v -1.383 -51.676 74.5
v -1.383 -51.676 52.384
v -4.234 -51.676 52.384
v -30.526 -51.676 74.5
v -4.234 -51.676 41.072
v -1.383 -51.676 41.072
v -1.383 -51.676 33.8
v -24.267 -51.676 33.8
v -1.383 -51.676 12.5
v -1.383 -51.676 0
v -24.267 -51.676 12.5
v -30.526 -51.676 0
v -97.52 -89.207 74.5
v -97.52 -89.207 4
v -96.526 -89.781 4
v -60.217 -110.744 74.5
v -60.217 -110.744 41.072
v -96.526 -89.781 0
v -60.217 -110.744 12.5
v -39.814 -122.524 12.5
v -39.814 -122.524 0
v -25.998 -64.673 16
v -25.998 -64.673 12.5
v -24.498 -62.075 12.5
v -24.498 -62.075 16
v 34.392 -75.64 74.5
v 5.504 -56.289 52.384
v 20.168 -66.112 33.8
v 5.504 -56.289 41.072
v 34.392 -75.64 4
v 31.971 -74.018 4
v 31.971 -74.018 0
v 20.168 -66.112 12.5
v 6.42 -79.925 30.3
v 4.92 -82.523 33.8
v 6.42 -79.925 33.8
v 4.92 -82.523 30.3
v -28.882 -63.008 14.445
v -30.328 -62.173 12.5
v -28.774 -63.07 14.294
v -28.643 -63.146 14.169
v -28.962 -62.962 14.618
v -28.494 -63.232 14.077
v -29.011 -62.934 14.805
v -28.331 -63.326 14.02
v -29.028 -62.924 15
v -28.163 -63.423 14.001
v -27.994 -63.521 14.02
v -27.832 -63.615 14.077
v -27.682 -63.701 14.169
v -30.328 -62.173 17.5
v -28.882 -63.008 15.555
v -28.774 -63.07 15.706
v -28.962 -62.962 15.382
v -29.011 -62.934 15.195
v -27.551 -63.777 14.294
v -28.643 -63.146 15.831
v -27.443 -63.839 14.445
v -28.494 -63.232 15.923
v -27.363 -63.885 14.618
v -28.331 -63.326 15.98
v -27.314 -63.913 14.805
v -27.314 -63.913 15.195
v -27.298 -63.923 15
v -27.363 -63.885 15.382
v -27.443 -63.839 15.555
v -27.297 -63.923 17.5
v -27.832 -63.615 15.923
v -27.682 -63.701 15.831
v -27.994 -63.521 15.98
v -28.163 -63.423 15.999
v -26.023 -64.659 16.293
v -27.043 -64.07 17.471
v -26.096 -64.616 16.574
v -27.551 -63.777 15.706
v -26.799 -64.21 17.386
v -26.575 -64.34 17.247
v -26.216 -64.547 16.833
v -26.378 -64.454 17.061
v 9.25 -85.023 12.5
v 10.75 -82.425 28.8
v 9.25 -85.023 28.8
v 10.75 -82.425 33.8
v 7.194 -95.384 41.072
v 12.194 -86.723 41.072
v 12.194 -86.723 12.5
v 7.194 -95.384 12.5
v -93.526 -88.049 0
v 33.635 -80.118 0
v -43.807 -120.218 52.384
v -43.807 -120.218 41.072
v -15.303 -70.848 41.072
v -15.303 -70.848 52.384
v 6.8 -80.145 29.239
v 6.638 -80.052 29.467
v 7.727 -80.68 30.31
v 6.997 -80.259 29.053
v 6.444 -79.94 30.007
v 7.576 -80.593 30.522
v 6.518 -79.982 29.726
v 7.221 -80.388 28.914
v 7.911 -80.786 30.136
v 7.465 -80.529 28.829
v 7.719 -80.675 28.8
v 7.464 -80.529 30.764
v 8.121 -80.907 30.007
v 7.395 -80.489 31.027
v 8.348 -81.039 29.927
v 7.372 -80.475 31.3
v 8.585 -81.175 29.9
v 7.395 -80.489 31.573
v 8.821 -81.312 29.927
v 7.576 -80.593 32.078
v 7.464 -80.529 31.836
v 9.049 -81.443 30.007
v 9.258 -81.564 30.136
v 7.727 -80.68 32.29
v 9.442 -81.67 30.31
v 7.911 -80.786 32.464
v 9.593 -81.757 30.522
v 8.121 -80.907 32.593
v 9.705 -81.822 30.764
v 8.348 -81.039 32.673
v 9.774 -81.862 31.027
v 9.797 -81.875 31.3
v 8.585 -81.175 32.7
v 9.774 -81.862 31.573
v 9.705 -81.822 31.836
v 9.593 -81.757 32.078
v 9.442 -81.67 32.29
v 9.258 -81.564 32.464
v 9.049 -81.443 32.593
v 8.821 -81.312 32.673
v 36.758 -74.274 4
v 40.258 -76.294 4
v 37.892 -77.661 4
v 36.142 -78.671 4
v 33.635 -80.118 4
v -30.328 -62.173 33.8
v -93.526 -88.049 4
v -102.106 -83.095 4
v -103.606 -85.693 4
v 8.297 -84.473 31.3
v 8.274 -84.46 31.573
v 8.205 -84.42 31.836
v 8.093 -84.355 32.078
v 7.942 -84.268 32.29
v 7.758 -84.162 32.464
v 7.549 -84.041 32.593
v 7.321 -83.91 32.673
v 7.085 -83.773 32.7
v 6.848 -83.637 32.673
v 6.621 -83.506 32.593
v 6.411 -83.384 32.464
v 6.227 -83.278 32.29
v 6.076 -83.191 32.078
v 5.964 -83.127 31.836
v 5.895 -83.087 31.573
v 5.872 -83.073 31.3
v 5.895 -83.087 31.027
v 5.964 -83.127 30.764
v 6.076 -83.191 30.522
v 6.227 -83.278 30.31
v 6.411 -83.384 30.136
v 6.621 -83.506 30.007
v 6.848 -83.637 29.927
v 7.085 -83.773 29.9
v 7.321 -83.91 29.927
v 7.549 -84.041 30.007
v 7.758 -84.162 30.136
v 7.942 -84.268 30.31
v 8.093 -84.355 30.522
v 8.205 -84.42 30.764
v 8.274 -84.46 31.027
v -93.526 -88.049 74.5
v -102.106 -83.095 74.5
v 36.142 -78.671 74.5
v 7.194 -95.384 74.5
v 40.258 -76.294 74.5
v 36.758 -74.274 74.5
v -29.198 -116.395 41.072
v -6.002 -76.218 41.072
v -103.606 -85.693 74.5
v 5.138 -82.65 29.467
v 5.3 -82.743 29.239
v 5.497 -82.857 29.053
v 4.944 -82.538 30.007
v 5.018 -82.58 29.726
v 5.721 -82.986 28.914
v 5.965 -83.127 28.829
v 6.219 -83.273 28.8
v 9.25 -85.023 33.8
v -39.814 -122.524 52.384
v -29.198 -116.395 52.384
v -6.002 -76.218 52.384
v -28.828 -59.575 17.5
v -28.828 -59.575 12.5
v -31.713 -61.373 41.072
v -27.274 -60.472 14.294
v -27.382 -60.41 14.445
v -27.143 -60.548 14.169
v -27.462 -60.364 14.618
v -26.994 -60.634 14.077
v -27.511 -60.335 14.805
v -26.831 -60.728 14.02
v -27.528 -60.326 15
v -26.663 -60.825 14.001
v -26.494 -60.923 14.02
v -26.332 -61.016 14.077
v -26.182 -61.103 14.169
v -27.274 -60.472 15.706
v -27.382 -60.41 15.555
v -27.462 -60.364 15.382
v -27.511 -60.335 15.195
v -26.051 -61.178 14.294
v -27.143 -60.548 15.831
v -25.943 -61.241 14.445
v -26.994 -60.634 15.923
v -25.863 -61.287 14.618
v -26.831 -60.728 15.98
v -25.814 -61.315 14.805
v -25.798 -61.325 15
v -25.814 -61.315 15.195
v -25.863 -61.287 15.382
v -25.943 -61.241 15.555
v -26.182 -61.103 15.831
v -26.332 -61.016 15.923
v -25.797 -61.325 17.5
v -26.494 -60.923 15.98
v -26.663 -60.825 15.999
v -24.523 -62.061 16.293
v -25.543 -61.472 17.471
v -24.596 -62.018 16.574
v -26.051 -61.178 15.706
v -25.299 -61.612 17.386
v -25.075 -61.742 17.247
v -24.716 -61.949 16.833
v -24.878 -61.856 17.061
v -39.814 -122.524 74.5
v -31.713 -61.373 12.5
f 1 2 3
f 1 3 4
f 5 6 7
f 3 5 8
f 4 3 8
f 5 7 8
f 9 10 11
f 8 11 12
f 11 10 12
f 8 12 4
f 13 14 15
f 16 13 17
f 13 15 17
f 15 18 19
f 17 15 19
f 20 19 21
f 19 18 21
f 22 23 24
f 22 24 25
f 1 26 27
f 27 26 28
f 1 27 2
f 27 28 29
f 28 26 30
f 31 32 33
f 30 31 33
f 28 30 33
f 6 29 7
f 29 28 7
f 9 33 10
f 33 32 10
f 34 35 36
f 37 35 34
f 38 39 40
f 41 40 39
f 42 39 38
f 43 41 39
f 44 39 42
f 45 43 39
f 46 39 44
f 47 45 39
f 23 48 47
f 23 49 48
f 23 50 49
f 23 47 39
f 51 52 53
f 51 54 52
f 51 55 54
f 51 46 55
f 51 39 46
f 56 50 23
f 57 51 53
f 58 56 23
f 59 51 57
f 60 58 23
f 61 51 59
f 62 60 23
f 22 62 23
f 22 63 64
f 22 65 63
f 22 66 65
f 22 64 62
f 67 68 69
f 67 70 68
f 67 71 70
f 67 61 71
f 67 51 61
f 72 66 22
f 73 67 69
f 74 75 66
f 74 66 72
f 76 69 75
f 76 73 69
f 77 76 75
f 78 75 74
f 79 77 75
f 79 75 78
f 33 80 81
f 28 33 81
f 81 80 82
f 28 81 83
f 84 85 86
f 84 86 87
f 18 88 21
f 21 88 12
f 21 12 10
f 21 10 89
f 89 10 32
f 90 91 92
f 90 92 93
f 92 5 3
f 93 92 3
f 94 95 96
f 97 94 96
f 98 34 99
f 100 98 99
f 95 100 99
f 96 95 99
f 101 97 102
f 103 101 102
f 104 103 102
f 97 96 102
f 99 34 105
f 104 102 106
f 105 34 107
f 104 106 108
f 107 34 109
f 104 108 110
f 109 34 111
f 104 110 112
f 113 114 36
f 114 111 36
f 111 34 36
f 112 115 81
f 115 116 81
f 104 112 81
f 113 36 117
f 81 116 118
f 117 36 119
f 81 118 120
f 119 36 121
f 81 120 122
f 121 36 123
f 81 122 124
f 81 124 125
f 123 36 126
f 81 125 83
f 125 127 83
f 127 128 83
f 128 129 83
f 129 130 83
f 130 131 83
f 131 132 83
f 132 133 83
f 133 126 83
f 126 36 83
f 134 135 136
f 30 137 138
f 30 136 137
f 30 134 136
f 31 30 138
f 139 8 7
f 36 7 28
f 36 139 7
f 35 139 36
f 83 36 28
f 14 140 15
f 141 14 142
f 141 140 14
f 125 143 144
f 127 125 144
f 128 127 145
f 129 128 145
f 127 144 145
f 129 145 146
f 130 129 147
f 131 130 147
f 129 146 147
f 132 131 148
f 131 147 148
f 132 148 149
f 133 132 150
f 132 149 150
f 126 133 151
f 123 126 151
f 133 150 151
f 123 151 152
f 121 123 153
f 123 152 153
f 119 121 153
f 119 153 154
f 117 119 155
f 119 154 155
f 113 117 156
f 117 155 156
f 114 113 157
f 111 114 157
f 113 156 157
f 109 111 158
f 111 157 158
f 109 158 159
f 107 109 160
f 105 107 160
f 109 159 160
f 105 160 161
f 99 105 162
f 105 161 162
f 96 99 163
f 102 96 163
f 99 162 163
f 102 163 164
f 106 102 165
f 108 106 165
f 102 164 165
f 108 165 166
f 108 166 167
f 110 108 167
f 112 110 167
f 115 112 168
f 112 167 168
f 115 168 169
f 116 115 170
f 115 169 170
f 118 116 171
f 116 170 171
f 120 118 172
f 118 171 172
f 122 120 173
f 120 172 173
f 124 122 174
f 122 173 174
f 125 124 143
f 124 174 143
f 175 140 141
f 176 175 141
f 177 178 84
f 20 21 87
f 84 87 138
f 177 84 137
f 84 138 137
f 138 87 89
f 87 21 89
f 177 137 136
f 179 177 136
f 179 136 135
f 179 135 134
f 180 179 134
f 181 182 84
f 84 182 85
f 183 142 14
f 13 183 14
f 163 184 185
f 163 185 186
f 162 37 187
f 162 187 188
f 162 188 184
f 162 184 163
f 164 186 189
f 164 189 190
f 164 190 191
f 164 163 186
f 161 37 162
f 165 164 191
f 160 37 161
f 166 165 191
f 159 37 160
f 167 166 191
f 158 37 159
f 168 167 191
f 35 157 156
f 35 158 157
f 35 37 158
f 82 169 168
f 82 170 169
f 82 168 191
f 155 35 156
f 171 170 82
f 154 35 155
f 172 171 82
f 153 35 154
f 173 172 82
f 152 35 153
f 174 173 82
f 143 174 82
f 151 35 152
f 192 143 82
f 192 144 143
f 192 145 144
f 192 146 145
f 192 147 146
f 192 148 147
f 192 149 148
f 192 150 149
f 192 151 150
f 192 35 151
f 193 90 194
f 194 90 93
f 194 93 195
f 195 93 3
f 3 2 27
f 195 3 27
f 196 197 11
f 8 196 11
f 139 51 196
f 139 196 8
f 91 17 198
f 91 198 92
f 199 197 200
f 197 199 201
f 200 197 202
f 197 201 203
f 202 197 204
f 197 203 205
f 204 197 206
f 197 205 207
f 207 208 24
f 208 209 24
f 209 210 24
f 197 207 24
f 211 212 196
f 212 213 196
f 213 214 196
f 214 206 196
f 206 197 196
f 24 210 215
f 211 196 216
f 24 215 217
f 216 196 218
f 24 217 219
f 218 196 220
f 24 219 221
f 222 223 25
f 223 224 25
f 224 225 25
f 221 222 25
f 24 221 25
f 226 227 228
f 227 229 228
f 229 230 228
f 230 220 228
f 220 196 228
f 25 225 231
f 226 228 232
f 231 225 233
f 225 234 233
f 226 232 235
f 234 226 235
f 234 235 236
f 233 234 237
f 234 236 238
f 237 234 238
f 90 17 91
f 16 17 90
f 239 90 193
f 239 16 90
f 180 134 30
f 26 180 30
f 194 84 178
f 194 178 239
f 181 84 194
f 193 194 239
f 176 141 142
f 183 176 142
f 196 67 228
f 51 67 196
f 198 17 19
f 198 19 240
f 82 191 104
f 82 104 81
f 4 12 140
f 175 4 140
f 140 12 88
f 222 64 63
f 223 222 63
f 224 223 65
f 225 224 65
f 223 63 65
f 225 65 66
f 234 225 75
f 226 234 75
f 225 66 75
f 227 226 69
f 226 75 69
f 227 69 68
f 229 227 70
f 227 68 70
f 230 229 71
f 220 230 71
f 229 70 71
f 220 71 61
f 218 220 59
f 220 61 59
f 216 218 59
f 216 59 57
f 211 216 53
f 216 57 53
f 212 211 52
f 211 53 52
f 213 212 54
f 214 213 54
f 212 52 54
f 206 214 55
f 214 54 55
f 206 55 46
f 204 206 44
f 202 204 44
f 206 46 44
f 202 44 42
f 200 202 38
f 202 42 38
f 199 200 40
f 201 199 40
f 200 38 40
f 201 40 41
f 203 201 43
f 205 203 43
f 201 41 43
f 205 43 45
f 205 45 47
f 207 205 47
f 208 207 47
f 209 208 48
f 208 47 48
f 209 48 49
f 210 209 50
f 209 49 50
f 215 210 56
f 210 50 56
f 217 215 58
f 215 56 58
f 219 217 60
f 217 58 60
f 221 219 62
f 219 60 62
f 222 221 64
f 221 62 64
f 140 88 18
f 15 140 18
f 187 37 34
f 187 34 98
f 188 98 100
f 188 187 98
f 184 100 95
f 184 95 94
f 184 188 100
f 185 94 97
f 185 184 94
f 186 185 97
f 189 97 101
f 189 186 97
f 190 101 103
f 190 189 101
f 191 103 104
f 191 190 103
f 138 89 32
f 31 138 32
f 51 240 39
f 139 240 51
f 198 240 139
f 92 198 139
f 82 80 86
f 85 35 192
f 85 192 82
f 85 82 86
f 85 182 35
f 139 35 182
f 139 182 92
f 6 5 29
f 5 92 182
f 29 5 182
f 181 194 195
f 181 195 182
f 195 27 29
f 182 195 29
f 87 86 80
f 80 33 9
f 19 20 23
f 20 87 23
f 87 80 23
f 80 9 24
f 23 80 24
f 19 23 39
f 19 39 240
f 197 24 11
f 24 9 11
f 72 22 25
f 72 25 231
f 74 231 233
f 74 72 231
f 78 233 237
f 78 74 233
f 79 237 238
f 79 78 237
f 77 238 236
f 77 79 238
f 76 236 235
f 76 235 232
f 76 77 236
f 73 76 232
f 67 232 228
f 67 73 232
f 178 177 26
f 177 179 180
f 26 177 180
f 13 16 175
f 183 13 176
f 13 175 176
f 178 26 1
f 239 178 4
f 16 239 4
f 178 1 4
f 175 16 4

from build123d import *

# Parameters (mm, degrees)
EXTRUDE_1_DEPTH     = 74.5
CUT_EXTRUDE_1_DEPTH = 4
CUT_EXTRUDE_2_DEPTH = 4
CUT_EXTRUDE_3_DEPTH = 62
CUT_EXTRUDE_4_REACH = 124.795
SKETCH_5_W          = 45.7
SKETCH_5_H          = 21.3
SKETCH_6_R          = 0.998844791
SKETCH_6_R_2        = 1.4
EXTRUDE_2_DEPTH     = 3
CUT_EXTRUDE_5_REACH = 124.795
SKETCH_7_W          = 10.739655284
SKETCH_7_H          = 11.312103995
EXTRUDE_3_DEPTH     = 57.007858917
CUT_EXTRUDE_6_DEPTH = 74.5


with BuildPart() as part:
    # 草圖1 → 填料-伸長1 (new body)
    with BuildSketch(Plane.XY):
        Polygon((-93.525975622, -88.048741595), (-102.106102641, -83.095002951), (-103.606102641, -85.693079162), (-97.519536964, -89.207159494), (-39.813710348, -122.523634025), (36.141513372, -78.670865164), (40.257538776, -76.294476789), (36.757538776, -74.273750847), (34.391513372, -75.639776251), (-1.383477376, -51.675674636), (-30.525975622, -51.675674636), align=None)
    extrude(amount=EXTRUDE_1_DEPTH)

    # 草圖2 → 除料-伸長1 (cut)
    with BuildSketch(Plane(origin=(0, 0, 0), x_dir=(-1, 0, 0), z_dir=(0, 0, -1))):
        Polygon((-40.257538776, -76.294476789), (-36.757538776, -74.273750847), (-34.391513372, -75.639776251), (-37.891513372, -77.660502193), align=None)
        Polygon((102.106102641, -83.095002951), (93.525975622, -88.048741595), (96.525975622, -89.780792402), (103.606102641, -85.693079162), align=None)
    extrude(amount=-CUT_EXTRUDE_1_DEPTH, mode=Mode.SUBTRACT)

    # 草圖3 → 除料-伸長2 (cut)
    with BuildSketch(Plane(origin=(0, 0, 0), x_dir=(-1, 0, 0), z_dir=(0, 0, -1))):
        Polygon((-33.635403301, -80.117768489), (-31.970986825, -74.018371384), (-37.891513372, -77.660502193), align=None)
    extrude(amount=-CUT_EXTRUDE_2_DEPTH, mode=Mode.SUBTRACT)

    # 草圖4 → 除料-伸長3 (cut)
    with BuildSketch(Plane.XY.offset(74.5)):
        Polygon((-60.217268861, -110.743634025), (-31.713339402, -61.373379987), (12.19414857, -86.723379987), (7.19414857, -95.383634025), (-39.813710348, -122.523634025), align=None)
    extrude(amount=-CUT_EXTRUDE_3_DEPTH, mode=Mode.SUBTRACT)

    # 草圖5 → 除料-伸長4 (cut, up to next)
    with BuildSketch(Plane(origin=(-34.503787943, -59.762313771, 0), x_dir=(0.8660254037844352, -0.500000000000006, 0), z_dir=(-0.500000000000006, -0.8660254037844352, 0)), mode=Mode.PRIVATE) as cut_extrude_4_sk1:
        with Locations((27.672132433, 23.15)):
            Rectangle(SKETCH_5_W, SKETCH_5_H)
    cut_extrude_4_tool1 = extrude(cut_extrude_4_sk1.sketch, amount=-CUT_EXTRUDE_4_REACH, mode=Mode.PRIVATE) & part.part
    add(cut_extrude_4_tool1.solids().sort_by_distance((-10.539018, -73.59838, 23.15))[0], mode=Mode.SUBTRACT)

    # 草圖6 → 填料-伸長2 (add)
    # profile 1 of 2: a face of its own
    with BuildSketch(Plane(origin=(-34.503787943, -59.762313771, 0), x_dir=(0.8660254037844352, -0.500000000000006, 0), z_dir=(-0.500000000000006, -0.8660254037844352, 0))):
        with BuildLine():
            Line((4.822132433, 17.5), (4.822132433, 12.5))
            Line((4.822132433, 12.5), (9.822132433, 12.5))
            Line((9.822132433, 12.5), (9.822132433, 16))
            ThreePointArc((9.822132433, 16), (9.382792604, 17.060660172), (8.322132433, 17.5))
            Line((8.322132433, 17.5), (4.822132433, 17.5))
        make_face()
        with Locations((7.322132433, 15)):
            Circle(SKETCH_6_R, mode=Mode.SUBTRACT)
    # profile 2 of 2: a face of its own
    with BuildSketch(Plane(origin=(-34.503787943, -59.762313771, 0), x_dir=(0.8660254037844352, -0.500000000000006, 0), z_dir=(-0.500000000000006, -0.8660254037844352, 0))):
        with BuildLine():
            Line((50.522132433, 28.8), (50.522132433, 33.8))
            Line((50.522132433, 33.8), (45.522132433, 33.8))
            Line((45.522132433, 33.8), (45.522132433, 30.299999983))
            ThreePointArc((45.522132433, 30.299999983), (45.961472267, 29.239339822), (47.022132433, 28.8))
            Line((47.022132433, 28.8), (50.522132433, 28.8))
        make_face()
        with Locations((48.022132433, 31.3)):
            Circle(SKETCH_6_R_2, mode=Mode.SUBTRACT)
    extrude(amount=-EXTRUDE_2_DEPTH)

    # 草圖7 → 除料-伸長5 (cut, up to next)
    with BuildSketch(Plane(origin=(-34.503787943, -59.762313771, 0), x_dir=(0.8660254037844352, -0.500000000000006, 0), z_dir=(-0.500000000000006, -0.8660254037844352, 0)), mode=Mode.PRIVATE) as cut_extrude_5_sk1:
        with Locations((27.54107715, 46.72819857)):
            Rectangle(SKETCH_7_W, SKETCH_7_H)
    cut_extrude_5_tool1 = extrude(cut_extrude_5_sk1.sketch, amount=-CUT_EXTRUDE_5_REACH, mode=Mode.PRIVATE) & part.part
    add(cut_extrude_5_tool1.solids().sort_by_distance((-10.652515, -73.532852, 46.728199))[0], mode=Mode.SUBTRACT)

    # 草圖8 → 填料-伸長3 (add)
    with BuildSketch(Plane(origin=(-34.503787943, -59.762313771, 0), x_dir=(0.8660254037844352, -0.500000000000006, 0), z_dir=(-0.500000000000006, -0.8660254037844352, 0))):
        Polygon((22.171249508, 41.072146572), (22.171249508, 52.384250567), (32.910904792, 52.384250567), (32.910904792, 41.072146572), (53.922132433, 41.072146572), (53.922132433, 74.5), (3.222132433, 74.5), (3.222132433, 41.072146572), align=None)
    extrude(amount=EXTRUDE_3_DEPTH)

    # 草圖9 → 除料-伸長6 (cut)
    with BuildSketch(Plane(origin=(0, 0, 0), x_dir=(-1, 0, 0), z_dir=(0, 0, -1))):
        Polygon((39.813710348, -122.523634025), (16.309780889, -136.093634025), (-7.19414857, -95.383634025), align=None)
    extrude(amount=-CUT_EXTRUDE_6_DEPTH, mode=Mode.SUBTRACT)


solid = part.part
